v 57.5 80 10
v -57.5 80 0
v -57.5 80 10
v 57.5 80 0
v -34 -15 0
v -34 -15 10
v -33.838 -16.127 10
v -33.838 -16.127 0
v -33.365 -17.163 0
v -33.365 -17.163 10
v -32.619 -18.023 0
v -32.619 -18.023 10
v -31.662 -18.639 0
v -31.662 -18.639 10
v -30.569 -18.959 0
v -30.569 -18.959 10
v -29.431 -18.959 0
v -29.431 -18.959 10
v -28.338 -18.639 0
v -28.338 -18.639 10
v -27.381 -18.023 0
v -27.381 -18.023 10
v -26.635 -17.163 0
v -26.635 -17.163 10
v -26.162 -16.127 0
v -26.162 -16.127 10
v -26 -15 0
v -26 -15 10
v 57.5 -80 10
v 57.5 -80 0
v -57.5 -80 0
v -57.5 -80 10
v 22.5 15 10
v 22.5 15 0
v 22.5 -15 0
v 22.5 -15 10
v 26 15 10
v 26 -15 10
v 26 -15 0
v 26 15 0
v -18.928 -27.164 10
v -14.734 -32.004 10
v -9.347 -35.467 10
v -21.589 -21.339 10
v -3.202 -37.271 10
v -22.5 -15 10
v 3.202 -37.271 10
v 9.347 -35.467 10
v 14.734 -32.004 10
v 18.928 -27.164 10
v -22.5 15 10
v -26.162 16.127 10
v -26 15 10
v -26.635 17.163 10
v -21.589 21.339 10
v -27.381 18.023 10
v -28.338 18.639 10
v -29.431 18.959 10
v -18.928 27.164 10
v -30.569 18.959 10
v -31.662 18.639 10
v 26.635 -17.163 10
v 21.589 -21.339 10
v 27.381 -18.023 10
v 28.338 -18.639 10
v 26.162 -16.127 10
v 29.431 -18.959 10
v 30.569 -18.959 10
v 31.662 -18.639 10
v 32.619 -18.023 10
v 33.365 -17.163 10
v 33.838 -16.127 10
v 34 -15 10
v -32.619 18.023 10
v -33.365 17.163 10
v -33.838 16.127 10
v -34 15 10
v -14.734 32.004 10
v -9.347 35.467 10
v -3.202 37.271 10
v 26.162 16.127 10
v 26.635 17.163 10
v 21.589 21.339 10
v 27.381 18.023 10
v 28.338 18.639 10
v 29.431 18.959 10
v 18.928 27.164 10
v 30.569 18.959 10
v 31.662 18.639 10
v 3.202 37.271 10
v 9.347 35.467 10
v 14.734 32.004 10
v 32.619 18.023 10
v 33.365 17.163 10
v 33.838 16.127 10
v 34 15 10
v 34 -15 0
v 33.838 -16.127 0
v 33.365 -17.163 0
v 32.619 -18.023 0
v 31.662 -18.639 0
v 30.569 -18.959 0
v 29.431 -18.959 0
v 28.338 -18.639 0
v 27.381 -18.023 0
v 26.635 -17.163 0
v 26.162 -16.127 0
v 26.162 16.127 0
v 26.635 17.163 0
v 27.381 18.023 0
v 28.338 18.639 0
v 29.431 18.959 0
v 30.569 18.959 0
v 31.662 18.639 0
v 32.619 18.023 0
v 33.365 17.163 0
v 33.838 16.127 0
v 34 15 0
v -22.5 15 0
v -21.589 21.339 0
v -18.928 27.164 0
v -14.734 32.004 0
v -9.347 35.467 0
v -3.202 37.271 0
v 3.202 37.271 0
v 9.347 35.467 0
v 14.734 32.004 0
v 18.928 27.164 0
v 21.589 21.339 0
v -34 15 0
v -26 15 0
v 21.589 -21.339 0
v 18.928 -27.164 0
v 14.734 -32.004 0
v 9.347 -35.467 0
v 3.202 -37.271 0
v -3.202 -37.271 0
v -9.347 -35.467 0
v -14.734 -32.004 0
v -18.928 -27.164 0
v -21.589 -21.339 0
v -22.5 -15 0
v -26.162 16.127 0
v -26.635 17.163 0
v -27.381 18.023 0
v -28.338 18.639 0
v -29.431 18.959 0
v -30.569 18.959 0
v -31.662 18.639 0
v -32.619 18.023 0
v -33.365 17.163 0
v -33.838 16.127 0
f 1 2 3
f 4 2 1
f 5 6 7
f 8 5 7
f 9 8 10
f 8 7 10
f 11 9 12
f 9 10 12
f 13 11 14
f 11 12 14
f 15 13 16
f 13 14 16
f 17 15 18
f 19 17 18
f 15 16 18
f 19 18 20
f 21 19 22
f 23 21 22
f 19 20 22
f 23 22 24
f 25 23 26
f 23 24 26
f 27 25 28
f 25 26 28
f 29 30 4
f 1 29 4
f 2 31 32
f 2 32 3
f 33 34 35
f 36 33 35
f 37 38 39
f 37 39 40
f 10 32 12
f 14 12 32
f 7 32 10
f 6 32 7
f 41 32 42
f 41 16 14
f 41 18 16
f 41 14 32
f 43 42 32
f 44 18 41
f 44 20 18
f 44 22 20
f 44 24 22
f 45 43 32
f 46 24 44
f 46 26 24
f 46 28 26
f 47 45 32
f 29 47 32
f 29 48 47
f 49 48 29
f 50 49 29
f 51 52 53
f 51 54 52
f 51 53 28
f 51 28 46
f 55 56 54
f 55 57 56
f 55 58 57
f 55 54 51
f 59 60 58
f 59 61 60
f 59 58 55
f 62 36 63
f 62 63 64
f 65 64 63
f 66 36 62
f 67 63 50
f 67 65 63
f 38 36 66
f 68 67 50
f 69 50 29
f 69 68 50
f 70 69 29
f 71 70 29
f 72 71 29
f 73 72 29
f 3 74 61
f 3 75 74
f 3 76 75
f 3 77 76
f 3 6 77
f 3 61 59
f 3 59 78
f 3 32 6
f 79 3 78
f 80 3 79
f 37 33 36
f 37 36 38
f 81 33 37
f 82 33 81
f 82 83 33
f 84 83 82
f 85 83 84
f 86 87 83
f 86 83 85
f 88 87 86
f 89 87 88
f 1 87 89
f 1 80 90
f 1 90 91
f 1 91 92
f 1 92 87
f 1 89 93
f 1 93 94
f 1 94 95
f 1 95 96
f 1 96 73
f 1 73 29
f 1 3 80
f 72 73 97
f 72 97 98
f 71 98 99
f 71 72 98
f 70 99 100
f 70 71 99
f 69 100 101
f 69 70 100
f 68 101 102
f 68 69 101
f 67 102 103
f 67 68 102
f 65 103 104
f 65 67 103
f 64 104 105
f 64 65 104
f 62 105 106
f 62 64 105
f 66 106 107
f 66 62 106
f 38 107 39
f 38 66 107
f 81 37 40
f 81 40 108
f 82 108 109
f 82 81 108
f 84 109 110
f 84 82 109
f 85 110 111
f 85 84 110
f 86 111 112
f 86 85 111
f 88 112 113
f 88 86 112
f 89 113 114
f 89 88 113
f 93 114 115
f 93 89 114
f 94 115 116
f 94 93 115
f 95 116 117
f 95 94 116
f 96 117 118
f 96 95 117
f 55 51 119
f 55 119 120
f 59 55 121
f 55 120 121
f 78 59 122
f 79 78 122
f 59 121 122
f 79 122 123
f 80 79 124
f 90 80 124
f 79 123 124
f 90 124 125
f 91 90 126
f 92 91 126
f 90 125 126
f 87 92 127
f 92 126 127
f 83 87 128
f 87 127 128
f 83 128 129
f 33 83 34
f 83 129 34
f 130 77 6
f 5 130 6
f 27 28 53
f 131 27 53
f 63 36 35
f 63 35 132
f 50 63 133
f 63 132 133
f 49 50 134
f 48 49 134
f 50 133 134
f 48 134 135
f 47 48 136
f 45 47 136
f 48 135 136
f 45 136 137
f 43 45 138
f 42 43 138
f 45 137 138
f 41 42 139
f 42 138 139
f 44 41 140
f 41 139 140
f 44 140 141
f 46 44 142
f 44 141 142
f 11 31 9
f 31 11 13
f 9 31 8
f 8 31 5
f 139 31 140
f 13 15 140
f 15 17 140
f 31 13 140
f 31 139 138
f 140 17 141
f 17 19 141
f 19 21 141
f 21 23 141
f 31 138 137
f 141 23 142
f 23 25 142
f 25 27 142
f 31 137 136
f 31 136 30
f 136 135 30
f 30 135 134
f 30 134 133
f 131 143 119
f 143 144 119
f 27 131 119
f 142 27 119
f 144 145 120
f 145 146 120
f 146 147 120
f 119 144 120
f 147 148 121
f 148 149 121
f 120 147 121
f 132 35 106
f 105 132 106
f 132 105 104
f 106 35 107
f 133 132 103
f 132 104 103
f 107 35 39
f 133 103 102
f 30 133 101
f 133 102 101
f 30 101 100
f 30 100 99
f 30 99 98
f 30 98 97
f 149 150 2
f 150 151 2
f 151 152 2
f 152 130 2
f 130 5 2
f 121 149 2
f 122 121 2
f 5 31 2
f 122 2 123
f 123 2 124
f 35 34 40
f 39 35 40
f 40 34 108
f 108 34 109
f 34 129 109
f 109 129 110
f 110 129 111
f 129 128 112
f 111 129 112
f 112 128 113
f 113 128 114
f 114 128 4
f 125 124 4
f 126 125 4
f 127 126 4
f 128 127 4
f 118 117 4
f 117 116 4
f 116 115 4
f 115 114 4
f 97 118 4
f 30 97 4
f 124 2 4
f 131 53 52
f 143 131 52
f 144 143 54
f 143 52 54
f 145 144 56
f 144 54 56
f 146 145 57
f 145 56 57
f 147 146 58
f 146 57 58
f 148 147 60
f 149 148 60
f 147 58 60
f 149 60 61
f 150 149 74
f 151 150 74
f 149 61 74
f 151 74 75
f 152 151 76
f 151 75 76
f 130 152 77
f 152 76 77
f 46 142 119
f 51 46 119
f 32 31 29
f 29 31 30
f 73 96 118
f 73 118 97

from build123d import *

# Parameters (mm, degrees)
F0_W     = 115
F0_H     = 160
F1_DEPTH = 10
F3_DEPTH = 10.001


# Not quite as in the source:
# - a pattern or mirror of a feature is missing from the dataset's text; its kind, count and spacing are read off the source's solid


with BuildPart() as f1:
    # F0 (on Top) → F1 (new body)
    with BuildSketch(Plane.XY):
        Rectangle(F0_W, F0_H)
        with BuildLine():
            Line((-22.5, -15), (-22.5, 15))
            ThreePointArc((-22.5, 15), (0, 37.5), (22.5, 15))
            Line((22.5, 15), (22.5, -15))
            ThreePointArc((22.5, -15), (0, -37.5), (-22.5, -15))
        make_face(mode=Mode.SUBTRACT)
    extrude(amount=F1_DEPTH)

    # F2 (on face) → F3 (cut, through all)
    with BuildSketch(Plane.XY.offset(10)):
        with BuildLine():
            ThreePointArc((-26, 15), (-30, 19), (-34, 15))
            Line((-34, 15), (-34, -15))
            ThreePointArc((-34, -15), (-30, -19), (-26, -15))
            Line((-26, -15), (-26, 0))
            Line((-26, 0), (-26, 15))
        make_face()
    f3 = extrude(amount=-F3_DEPTH, mode=Mode.SUBTRACT)

    # F3_copies: F3 across plane
    add(f3.mirror(Plane(origin=(0, 0, 0), x_dir=(0, 0, 1), z_dir=(1, 0, 0))), mode=Mode.SUBTRACT)


solid = f1.part
